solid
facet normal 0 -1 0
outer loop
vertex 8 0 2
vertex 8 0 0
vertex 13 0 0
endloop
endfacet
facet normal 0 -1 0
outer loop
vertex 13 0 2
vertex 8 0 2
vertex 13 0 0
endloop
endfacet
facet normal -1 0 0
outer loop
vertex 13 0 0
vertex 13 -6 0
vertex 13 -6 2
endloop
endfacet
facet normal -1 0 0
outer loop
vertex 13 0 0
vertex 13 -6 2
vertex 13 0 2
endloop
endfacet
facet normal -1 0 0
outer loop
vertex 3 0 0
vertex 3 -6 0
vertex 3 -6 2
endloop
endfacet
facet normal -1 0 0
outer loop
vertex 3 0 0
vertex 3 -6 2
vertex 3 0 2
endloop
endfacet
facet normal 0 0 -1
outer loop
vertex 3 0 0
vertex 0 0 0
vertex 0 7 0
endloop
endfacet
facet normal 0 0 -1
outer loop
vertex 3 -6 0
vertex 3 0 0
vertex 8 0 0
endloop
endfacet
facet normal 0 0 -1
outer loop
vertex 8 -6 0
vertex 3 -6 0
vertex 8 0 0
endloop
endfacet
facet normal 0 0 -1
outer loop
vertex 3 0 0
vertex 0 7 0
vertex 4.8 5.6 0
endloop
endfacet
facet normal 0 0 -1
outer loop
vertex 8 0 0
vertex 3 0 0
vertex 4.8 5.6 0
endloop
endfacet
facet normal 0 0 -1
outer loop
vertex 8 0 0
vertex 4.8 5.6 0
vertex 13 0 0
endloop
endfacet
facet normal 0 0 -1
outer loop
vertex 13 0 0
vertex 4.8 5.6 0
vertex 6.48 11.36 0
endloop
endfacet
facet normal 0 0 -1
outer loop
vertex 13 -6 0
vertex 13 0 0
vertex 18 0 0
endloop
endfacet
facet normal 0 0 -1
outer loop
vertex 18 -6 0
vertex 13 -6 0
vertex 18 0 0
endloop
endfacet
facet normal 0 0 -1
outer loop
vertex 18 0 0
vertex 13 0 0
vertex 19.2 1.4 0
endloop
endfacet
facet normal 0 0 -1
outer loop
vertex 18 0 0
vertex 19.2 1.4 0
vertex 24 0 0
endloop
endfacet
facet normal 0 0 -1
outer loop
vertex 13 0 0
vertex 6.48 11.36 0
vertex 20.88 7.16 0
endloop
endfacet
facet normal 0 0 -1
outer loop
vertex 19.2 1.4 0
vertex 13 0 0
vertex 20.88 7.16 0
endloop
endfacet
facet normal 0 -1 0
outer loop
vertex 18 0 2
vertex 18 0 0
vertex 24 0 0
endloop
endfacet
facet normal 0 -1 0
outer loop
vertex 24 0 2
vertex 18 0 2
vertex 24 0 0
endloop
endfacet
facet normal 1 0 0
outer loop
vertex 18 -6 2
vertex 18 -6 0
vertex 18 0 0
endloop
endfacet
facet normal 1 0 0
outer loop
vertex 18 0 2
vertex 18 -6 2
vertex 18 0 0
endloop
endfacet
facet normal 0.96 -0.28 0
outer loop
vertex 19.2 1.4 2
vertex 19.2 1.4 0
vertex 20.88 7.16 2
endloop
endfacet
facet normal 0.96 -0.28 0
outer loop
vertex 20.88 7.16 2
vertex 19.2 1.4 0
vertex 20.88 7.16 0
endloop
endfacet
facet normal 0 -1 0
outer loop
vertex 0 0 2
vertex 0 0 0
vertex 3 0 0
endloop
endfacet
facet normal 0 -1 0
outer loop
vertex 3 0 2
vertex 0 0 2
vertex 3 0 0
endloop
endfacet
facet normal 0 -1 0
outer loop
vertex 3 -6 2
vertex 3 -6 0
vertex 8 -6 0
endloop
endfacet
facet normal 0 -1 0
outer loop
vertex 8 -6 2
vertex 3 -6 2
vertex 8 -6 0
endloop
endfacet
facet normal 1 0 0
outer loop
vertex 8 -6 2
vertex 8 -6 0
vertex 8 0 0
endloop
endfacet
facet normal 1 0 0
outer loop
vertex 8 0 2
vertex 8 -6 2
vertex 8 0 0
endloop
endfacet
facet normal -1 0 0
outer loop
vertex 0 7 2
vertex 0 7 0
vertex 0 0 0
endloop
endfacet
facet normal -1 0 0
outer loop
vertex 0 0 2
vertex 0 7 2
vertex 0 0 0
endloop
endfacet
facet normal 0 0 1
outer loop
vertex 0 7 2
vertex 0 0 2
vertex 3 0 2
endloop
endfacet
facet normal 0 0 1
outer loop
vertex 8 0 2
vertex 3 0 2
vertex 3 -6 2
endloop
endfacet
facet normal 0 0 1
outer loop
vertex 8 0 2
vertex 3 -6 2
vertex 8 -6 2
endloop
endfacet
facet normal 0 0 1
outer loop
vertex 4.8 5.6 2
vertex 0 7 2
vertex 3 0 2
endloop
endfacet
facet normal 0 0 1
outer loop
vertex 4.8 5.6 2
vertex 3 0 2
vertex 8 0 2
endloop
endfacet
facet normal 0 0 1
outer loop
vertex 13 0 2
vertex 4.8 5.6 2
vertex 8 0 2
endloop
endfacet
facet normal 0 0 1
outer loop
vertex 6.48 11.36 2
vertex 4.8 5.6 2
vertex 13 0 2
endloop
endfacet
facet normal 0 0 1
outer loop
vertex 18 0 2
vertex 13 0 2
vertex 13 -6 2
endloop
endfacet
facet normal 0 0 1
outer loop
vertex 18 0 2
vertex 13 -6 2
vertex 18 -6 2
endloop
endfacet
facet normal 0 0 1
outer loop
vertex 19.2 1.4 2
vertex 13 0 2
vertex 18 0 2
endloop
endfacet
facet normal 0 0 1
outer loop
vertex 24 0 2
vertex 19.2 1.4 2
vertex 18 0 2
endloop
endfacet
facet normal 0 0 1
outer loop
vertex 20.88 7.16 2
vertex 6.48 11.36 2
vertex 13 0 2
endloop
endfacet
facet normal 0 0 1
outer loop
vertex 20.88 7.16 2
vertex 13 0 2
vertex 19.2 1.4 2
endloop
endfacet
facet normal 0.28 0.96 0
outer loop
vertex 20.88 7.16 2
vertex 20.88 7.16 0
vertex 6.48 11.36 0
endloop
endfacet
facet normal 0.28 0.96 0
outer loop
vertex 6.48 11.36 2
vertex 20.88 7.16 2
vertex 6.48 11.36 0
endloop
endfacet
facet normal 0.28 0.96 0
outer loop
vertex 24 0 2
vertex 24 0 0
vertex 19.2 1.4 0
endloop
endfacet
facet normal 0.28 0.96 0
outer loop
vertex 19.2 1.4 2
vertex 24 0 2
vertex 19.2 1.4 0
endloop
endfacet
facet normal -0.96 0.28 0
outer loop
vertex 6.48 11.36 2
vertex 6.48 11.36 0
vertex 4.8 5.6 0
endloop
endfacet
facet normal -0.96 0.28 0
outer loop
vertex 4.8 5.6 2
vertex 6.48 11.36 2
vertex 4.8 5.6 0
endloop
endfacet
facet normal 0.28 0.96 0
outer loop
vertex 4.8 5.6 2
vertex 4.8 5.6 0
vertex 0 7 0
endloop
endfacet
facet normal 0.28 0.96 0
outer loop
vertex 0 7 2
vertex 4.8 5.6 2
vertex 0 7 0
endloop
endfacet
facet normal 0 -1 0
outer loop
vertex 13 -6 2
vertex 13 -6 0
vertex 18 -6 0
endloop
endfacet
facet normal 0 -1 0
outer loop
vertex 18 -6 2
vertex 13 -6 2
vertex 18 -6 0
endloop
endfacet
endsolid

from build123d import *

# Parameters (mm, degrees)
Y_KSEKLIK_EKSTR_ZYON2_DEPTH = 2


with BuildPart() as part:
    # Çizim2 → Yükseklik-Ekstrüzyon2 (new body)
    with BuildSketch(Plane.XY):
        Polygon((0, 7), (0, 0), (3, 0), (3, -6), (8, -6), (8, 0), (13, 0), (13, -6), (18, -6), (18, 0), (24, 0), (19.2, 1.4), (20.88, 7.16), (6.48, 11.36), (4.8, 5.6), align=None)
    extrude(amount=Y_KSEKLIK_EKSTR_ZYON2_DEPTH)


solid = part.part
